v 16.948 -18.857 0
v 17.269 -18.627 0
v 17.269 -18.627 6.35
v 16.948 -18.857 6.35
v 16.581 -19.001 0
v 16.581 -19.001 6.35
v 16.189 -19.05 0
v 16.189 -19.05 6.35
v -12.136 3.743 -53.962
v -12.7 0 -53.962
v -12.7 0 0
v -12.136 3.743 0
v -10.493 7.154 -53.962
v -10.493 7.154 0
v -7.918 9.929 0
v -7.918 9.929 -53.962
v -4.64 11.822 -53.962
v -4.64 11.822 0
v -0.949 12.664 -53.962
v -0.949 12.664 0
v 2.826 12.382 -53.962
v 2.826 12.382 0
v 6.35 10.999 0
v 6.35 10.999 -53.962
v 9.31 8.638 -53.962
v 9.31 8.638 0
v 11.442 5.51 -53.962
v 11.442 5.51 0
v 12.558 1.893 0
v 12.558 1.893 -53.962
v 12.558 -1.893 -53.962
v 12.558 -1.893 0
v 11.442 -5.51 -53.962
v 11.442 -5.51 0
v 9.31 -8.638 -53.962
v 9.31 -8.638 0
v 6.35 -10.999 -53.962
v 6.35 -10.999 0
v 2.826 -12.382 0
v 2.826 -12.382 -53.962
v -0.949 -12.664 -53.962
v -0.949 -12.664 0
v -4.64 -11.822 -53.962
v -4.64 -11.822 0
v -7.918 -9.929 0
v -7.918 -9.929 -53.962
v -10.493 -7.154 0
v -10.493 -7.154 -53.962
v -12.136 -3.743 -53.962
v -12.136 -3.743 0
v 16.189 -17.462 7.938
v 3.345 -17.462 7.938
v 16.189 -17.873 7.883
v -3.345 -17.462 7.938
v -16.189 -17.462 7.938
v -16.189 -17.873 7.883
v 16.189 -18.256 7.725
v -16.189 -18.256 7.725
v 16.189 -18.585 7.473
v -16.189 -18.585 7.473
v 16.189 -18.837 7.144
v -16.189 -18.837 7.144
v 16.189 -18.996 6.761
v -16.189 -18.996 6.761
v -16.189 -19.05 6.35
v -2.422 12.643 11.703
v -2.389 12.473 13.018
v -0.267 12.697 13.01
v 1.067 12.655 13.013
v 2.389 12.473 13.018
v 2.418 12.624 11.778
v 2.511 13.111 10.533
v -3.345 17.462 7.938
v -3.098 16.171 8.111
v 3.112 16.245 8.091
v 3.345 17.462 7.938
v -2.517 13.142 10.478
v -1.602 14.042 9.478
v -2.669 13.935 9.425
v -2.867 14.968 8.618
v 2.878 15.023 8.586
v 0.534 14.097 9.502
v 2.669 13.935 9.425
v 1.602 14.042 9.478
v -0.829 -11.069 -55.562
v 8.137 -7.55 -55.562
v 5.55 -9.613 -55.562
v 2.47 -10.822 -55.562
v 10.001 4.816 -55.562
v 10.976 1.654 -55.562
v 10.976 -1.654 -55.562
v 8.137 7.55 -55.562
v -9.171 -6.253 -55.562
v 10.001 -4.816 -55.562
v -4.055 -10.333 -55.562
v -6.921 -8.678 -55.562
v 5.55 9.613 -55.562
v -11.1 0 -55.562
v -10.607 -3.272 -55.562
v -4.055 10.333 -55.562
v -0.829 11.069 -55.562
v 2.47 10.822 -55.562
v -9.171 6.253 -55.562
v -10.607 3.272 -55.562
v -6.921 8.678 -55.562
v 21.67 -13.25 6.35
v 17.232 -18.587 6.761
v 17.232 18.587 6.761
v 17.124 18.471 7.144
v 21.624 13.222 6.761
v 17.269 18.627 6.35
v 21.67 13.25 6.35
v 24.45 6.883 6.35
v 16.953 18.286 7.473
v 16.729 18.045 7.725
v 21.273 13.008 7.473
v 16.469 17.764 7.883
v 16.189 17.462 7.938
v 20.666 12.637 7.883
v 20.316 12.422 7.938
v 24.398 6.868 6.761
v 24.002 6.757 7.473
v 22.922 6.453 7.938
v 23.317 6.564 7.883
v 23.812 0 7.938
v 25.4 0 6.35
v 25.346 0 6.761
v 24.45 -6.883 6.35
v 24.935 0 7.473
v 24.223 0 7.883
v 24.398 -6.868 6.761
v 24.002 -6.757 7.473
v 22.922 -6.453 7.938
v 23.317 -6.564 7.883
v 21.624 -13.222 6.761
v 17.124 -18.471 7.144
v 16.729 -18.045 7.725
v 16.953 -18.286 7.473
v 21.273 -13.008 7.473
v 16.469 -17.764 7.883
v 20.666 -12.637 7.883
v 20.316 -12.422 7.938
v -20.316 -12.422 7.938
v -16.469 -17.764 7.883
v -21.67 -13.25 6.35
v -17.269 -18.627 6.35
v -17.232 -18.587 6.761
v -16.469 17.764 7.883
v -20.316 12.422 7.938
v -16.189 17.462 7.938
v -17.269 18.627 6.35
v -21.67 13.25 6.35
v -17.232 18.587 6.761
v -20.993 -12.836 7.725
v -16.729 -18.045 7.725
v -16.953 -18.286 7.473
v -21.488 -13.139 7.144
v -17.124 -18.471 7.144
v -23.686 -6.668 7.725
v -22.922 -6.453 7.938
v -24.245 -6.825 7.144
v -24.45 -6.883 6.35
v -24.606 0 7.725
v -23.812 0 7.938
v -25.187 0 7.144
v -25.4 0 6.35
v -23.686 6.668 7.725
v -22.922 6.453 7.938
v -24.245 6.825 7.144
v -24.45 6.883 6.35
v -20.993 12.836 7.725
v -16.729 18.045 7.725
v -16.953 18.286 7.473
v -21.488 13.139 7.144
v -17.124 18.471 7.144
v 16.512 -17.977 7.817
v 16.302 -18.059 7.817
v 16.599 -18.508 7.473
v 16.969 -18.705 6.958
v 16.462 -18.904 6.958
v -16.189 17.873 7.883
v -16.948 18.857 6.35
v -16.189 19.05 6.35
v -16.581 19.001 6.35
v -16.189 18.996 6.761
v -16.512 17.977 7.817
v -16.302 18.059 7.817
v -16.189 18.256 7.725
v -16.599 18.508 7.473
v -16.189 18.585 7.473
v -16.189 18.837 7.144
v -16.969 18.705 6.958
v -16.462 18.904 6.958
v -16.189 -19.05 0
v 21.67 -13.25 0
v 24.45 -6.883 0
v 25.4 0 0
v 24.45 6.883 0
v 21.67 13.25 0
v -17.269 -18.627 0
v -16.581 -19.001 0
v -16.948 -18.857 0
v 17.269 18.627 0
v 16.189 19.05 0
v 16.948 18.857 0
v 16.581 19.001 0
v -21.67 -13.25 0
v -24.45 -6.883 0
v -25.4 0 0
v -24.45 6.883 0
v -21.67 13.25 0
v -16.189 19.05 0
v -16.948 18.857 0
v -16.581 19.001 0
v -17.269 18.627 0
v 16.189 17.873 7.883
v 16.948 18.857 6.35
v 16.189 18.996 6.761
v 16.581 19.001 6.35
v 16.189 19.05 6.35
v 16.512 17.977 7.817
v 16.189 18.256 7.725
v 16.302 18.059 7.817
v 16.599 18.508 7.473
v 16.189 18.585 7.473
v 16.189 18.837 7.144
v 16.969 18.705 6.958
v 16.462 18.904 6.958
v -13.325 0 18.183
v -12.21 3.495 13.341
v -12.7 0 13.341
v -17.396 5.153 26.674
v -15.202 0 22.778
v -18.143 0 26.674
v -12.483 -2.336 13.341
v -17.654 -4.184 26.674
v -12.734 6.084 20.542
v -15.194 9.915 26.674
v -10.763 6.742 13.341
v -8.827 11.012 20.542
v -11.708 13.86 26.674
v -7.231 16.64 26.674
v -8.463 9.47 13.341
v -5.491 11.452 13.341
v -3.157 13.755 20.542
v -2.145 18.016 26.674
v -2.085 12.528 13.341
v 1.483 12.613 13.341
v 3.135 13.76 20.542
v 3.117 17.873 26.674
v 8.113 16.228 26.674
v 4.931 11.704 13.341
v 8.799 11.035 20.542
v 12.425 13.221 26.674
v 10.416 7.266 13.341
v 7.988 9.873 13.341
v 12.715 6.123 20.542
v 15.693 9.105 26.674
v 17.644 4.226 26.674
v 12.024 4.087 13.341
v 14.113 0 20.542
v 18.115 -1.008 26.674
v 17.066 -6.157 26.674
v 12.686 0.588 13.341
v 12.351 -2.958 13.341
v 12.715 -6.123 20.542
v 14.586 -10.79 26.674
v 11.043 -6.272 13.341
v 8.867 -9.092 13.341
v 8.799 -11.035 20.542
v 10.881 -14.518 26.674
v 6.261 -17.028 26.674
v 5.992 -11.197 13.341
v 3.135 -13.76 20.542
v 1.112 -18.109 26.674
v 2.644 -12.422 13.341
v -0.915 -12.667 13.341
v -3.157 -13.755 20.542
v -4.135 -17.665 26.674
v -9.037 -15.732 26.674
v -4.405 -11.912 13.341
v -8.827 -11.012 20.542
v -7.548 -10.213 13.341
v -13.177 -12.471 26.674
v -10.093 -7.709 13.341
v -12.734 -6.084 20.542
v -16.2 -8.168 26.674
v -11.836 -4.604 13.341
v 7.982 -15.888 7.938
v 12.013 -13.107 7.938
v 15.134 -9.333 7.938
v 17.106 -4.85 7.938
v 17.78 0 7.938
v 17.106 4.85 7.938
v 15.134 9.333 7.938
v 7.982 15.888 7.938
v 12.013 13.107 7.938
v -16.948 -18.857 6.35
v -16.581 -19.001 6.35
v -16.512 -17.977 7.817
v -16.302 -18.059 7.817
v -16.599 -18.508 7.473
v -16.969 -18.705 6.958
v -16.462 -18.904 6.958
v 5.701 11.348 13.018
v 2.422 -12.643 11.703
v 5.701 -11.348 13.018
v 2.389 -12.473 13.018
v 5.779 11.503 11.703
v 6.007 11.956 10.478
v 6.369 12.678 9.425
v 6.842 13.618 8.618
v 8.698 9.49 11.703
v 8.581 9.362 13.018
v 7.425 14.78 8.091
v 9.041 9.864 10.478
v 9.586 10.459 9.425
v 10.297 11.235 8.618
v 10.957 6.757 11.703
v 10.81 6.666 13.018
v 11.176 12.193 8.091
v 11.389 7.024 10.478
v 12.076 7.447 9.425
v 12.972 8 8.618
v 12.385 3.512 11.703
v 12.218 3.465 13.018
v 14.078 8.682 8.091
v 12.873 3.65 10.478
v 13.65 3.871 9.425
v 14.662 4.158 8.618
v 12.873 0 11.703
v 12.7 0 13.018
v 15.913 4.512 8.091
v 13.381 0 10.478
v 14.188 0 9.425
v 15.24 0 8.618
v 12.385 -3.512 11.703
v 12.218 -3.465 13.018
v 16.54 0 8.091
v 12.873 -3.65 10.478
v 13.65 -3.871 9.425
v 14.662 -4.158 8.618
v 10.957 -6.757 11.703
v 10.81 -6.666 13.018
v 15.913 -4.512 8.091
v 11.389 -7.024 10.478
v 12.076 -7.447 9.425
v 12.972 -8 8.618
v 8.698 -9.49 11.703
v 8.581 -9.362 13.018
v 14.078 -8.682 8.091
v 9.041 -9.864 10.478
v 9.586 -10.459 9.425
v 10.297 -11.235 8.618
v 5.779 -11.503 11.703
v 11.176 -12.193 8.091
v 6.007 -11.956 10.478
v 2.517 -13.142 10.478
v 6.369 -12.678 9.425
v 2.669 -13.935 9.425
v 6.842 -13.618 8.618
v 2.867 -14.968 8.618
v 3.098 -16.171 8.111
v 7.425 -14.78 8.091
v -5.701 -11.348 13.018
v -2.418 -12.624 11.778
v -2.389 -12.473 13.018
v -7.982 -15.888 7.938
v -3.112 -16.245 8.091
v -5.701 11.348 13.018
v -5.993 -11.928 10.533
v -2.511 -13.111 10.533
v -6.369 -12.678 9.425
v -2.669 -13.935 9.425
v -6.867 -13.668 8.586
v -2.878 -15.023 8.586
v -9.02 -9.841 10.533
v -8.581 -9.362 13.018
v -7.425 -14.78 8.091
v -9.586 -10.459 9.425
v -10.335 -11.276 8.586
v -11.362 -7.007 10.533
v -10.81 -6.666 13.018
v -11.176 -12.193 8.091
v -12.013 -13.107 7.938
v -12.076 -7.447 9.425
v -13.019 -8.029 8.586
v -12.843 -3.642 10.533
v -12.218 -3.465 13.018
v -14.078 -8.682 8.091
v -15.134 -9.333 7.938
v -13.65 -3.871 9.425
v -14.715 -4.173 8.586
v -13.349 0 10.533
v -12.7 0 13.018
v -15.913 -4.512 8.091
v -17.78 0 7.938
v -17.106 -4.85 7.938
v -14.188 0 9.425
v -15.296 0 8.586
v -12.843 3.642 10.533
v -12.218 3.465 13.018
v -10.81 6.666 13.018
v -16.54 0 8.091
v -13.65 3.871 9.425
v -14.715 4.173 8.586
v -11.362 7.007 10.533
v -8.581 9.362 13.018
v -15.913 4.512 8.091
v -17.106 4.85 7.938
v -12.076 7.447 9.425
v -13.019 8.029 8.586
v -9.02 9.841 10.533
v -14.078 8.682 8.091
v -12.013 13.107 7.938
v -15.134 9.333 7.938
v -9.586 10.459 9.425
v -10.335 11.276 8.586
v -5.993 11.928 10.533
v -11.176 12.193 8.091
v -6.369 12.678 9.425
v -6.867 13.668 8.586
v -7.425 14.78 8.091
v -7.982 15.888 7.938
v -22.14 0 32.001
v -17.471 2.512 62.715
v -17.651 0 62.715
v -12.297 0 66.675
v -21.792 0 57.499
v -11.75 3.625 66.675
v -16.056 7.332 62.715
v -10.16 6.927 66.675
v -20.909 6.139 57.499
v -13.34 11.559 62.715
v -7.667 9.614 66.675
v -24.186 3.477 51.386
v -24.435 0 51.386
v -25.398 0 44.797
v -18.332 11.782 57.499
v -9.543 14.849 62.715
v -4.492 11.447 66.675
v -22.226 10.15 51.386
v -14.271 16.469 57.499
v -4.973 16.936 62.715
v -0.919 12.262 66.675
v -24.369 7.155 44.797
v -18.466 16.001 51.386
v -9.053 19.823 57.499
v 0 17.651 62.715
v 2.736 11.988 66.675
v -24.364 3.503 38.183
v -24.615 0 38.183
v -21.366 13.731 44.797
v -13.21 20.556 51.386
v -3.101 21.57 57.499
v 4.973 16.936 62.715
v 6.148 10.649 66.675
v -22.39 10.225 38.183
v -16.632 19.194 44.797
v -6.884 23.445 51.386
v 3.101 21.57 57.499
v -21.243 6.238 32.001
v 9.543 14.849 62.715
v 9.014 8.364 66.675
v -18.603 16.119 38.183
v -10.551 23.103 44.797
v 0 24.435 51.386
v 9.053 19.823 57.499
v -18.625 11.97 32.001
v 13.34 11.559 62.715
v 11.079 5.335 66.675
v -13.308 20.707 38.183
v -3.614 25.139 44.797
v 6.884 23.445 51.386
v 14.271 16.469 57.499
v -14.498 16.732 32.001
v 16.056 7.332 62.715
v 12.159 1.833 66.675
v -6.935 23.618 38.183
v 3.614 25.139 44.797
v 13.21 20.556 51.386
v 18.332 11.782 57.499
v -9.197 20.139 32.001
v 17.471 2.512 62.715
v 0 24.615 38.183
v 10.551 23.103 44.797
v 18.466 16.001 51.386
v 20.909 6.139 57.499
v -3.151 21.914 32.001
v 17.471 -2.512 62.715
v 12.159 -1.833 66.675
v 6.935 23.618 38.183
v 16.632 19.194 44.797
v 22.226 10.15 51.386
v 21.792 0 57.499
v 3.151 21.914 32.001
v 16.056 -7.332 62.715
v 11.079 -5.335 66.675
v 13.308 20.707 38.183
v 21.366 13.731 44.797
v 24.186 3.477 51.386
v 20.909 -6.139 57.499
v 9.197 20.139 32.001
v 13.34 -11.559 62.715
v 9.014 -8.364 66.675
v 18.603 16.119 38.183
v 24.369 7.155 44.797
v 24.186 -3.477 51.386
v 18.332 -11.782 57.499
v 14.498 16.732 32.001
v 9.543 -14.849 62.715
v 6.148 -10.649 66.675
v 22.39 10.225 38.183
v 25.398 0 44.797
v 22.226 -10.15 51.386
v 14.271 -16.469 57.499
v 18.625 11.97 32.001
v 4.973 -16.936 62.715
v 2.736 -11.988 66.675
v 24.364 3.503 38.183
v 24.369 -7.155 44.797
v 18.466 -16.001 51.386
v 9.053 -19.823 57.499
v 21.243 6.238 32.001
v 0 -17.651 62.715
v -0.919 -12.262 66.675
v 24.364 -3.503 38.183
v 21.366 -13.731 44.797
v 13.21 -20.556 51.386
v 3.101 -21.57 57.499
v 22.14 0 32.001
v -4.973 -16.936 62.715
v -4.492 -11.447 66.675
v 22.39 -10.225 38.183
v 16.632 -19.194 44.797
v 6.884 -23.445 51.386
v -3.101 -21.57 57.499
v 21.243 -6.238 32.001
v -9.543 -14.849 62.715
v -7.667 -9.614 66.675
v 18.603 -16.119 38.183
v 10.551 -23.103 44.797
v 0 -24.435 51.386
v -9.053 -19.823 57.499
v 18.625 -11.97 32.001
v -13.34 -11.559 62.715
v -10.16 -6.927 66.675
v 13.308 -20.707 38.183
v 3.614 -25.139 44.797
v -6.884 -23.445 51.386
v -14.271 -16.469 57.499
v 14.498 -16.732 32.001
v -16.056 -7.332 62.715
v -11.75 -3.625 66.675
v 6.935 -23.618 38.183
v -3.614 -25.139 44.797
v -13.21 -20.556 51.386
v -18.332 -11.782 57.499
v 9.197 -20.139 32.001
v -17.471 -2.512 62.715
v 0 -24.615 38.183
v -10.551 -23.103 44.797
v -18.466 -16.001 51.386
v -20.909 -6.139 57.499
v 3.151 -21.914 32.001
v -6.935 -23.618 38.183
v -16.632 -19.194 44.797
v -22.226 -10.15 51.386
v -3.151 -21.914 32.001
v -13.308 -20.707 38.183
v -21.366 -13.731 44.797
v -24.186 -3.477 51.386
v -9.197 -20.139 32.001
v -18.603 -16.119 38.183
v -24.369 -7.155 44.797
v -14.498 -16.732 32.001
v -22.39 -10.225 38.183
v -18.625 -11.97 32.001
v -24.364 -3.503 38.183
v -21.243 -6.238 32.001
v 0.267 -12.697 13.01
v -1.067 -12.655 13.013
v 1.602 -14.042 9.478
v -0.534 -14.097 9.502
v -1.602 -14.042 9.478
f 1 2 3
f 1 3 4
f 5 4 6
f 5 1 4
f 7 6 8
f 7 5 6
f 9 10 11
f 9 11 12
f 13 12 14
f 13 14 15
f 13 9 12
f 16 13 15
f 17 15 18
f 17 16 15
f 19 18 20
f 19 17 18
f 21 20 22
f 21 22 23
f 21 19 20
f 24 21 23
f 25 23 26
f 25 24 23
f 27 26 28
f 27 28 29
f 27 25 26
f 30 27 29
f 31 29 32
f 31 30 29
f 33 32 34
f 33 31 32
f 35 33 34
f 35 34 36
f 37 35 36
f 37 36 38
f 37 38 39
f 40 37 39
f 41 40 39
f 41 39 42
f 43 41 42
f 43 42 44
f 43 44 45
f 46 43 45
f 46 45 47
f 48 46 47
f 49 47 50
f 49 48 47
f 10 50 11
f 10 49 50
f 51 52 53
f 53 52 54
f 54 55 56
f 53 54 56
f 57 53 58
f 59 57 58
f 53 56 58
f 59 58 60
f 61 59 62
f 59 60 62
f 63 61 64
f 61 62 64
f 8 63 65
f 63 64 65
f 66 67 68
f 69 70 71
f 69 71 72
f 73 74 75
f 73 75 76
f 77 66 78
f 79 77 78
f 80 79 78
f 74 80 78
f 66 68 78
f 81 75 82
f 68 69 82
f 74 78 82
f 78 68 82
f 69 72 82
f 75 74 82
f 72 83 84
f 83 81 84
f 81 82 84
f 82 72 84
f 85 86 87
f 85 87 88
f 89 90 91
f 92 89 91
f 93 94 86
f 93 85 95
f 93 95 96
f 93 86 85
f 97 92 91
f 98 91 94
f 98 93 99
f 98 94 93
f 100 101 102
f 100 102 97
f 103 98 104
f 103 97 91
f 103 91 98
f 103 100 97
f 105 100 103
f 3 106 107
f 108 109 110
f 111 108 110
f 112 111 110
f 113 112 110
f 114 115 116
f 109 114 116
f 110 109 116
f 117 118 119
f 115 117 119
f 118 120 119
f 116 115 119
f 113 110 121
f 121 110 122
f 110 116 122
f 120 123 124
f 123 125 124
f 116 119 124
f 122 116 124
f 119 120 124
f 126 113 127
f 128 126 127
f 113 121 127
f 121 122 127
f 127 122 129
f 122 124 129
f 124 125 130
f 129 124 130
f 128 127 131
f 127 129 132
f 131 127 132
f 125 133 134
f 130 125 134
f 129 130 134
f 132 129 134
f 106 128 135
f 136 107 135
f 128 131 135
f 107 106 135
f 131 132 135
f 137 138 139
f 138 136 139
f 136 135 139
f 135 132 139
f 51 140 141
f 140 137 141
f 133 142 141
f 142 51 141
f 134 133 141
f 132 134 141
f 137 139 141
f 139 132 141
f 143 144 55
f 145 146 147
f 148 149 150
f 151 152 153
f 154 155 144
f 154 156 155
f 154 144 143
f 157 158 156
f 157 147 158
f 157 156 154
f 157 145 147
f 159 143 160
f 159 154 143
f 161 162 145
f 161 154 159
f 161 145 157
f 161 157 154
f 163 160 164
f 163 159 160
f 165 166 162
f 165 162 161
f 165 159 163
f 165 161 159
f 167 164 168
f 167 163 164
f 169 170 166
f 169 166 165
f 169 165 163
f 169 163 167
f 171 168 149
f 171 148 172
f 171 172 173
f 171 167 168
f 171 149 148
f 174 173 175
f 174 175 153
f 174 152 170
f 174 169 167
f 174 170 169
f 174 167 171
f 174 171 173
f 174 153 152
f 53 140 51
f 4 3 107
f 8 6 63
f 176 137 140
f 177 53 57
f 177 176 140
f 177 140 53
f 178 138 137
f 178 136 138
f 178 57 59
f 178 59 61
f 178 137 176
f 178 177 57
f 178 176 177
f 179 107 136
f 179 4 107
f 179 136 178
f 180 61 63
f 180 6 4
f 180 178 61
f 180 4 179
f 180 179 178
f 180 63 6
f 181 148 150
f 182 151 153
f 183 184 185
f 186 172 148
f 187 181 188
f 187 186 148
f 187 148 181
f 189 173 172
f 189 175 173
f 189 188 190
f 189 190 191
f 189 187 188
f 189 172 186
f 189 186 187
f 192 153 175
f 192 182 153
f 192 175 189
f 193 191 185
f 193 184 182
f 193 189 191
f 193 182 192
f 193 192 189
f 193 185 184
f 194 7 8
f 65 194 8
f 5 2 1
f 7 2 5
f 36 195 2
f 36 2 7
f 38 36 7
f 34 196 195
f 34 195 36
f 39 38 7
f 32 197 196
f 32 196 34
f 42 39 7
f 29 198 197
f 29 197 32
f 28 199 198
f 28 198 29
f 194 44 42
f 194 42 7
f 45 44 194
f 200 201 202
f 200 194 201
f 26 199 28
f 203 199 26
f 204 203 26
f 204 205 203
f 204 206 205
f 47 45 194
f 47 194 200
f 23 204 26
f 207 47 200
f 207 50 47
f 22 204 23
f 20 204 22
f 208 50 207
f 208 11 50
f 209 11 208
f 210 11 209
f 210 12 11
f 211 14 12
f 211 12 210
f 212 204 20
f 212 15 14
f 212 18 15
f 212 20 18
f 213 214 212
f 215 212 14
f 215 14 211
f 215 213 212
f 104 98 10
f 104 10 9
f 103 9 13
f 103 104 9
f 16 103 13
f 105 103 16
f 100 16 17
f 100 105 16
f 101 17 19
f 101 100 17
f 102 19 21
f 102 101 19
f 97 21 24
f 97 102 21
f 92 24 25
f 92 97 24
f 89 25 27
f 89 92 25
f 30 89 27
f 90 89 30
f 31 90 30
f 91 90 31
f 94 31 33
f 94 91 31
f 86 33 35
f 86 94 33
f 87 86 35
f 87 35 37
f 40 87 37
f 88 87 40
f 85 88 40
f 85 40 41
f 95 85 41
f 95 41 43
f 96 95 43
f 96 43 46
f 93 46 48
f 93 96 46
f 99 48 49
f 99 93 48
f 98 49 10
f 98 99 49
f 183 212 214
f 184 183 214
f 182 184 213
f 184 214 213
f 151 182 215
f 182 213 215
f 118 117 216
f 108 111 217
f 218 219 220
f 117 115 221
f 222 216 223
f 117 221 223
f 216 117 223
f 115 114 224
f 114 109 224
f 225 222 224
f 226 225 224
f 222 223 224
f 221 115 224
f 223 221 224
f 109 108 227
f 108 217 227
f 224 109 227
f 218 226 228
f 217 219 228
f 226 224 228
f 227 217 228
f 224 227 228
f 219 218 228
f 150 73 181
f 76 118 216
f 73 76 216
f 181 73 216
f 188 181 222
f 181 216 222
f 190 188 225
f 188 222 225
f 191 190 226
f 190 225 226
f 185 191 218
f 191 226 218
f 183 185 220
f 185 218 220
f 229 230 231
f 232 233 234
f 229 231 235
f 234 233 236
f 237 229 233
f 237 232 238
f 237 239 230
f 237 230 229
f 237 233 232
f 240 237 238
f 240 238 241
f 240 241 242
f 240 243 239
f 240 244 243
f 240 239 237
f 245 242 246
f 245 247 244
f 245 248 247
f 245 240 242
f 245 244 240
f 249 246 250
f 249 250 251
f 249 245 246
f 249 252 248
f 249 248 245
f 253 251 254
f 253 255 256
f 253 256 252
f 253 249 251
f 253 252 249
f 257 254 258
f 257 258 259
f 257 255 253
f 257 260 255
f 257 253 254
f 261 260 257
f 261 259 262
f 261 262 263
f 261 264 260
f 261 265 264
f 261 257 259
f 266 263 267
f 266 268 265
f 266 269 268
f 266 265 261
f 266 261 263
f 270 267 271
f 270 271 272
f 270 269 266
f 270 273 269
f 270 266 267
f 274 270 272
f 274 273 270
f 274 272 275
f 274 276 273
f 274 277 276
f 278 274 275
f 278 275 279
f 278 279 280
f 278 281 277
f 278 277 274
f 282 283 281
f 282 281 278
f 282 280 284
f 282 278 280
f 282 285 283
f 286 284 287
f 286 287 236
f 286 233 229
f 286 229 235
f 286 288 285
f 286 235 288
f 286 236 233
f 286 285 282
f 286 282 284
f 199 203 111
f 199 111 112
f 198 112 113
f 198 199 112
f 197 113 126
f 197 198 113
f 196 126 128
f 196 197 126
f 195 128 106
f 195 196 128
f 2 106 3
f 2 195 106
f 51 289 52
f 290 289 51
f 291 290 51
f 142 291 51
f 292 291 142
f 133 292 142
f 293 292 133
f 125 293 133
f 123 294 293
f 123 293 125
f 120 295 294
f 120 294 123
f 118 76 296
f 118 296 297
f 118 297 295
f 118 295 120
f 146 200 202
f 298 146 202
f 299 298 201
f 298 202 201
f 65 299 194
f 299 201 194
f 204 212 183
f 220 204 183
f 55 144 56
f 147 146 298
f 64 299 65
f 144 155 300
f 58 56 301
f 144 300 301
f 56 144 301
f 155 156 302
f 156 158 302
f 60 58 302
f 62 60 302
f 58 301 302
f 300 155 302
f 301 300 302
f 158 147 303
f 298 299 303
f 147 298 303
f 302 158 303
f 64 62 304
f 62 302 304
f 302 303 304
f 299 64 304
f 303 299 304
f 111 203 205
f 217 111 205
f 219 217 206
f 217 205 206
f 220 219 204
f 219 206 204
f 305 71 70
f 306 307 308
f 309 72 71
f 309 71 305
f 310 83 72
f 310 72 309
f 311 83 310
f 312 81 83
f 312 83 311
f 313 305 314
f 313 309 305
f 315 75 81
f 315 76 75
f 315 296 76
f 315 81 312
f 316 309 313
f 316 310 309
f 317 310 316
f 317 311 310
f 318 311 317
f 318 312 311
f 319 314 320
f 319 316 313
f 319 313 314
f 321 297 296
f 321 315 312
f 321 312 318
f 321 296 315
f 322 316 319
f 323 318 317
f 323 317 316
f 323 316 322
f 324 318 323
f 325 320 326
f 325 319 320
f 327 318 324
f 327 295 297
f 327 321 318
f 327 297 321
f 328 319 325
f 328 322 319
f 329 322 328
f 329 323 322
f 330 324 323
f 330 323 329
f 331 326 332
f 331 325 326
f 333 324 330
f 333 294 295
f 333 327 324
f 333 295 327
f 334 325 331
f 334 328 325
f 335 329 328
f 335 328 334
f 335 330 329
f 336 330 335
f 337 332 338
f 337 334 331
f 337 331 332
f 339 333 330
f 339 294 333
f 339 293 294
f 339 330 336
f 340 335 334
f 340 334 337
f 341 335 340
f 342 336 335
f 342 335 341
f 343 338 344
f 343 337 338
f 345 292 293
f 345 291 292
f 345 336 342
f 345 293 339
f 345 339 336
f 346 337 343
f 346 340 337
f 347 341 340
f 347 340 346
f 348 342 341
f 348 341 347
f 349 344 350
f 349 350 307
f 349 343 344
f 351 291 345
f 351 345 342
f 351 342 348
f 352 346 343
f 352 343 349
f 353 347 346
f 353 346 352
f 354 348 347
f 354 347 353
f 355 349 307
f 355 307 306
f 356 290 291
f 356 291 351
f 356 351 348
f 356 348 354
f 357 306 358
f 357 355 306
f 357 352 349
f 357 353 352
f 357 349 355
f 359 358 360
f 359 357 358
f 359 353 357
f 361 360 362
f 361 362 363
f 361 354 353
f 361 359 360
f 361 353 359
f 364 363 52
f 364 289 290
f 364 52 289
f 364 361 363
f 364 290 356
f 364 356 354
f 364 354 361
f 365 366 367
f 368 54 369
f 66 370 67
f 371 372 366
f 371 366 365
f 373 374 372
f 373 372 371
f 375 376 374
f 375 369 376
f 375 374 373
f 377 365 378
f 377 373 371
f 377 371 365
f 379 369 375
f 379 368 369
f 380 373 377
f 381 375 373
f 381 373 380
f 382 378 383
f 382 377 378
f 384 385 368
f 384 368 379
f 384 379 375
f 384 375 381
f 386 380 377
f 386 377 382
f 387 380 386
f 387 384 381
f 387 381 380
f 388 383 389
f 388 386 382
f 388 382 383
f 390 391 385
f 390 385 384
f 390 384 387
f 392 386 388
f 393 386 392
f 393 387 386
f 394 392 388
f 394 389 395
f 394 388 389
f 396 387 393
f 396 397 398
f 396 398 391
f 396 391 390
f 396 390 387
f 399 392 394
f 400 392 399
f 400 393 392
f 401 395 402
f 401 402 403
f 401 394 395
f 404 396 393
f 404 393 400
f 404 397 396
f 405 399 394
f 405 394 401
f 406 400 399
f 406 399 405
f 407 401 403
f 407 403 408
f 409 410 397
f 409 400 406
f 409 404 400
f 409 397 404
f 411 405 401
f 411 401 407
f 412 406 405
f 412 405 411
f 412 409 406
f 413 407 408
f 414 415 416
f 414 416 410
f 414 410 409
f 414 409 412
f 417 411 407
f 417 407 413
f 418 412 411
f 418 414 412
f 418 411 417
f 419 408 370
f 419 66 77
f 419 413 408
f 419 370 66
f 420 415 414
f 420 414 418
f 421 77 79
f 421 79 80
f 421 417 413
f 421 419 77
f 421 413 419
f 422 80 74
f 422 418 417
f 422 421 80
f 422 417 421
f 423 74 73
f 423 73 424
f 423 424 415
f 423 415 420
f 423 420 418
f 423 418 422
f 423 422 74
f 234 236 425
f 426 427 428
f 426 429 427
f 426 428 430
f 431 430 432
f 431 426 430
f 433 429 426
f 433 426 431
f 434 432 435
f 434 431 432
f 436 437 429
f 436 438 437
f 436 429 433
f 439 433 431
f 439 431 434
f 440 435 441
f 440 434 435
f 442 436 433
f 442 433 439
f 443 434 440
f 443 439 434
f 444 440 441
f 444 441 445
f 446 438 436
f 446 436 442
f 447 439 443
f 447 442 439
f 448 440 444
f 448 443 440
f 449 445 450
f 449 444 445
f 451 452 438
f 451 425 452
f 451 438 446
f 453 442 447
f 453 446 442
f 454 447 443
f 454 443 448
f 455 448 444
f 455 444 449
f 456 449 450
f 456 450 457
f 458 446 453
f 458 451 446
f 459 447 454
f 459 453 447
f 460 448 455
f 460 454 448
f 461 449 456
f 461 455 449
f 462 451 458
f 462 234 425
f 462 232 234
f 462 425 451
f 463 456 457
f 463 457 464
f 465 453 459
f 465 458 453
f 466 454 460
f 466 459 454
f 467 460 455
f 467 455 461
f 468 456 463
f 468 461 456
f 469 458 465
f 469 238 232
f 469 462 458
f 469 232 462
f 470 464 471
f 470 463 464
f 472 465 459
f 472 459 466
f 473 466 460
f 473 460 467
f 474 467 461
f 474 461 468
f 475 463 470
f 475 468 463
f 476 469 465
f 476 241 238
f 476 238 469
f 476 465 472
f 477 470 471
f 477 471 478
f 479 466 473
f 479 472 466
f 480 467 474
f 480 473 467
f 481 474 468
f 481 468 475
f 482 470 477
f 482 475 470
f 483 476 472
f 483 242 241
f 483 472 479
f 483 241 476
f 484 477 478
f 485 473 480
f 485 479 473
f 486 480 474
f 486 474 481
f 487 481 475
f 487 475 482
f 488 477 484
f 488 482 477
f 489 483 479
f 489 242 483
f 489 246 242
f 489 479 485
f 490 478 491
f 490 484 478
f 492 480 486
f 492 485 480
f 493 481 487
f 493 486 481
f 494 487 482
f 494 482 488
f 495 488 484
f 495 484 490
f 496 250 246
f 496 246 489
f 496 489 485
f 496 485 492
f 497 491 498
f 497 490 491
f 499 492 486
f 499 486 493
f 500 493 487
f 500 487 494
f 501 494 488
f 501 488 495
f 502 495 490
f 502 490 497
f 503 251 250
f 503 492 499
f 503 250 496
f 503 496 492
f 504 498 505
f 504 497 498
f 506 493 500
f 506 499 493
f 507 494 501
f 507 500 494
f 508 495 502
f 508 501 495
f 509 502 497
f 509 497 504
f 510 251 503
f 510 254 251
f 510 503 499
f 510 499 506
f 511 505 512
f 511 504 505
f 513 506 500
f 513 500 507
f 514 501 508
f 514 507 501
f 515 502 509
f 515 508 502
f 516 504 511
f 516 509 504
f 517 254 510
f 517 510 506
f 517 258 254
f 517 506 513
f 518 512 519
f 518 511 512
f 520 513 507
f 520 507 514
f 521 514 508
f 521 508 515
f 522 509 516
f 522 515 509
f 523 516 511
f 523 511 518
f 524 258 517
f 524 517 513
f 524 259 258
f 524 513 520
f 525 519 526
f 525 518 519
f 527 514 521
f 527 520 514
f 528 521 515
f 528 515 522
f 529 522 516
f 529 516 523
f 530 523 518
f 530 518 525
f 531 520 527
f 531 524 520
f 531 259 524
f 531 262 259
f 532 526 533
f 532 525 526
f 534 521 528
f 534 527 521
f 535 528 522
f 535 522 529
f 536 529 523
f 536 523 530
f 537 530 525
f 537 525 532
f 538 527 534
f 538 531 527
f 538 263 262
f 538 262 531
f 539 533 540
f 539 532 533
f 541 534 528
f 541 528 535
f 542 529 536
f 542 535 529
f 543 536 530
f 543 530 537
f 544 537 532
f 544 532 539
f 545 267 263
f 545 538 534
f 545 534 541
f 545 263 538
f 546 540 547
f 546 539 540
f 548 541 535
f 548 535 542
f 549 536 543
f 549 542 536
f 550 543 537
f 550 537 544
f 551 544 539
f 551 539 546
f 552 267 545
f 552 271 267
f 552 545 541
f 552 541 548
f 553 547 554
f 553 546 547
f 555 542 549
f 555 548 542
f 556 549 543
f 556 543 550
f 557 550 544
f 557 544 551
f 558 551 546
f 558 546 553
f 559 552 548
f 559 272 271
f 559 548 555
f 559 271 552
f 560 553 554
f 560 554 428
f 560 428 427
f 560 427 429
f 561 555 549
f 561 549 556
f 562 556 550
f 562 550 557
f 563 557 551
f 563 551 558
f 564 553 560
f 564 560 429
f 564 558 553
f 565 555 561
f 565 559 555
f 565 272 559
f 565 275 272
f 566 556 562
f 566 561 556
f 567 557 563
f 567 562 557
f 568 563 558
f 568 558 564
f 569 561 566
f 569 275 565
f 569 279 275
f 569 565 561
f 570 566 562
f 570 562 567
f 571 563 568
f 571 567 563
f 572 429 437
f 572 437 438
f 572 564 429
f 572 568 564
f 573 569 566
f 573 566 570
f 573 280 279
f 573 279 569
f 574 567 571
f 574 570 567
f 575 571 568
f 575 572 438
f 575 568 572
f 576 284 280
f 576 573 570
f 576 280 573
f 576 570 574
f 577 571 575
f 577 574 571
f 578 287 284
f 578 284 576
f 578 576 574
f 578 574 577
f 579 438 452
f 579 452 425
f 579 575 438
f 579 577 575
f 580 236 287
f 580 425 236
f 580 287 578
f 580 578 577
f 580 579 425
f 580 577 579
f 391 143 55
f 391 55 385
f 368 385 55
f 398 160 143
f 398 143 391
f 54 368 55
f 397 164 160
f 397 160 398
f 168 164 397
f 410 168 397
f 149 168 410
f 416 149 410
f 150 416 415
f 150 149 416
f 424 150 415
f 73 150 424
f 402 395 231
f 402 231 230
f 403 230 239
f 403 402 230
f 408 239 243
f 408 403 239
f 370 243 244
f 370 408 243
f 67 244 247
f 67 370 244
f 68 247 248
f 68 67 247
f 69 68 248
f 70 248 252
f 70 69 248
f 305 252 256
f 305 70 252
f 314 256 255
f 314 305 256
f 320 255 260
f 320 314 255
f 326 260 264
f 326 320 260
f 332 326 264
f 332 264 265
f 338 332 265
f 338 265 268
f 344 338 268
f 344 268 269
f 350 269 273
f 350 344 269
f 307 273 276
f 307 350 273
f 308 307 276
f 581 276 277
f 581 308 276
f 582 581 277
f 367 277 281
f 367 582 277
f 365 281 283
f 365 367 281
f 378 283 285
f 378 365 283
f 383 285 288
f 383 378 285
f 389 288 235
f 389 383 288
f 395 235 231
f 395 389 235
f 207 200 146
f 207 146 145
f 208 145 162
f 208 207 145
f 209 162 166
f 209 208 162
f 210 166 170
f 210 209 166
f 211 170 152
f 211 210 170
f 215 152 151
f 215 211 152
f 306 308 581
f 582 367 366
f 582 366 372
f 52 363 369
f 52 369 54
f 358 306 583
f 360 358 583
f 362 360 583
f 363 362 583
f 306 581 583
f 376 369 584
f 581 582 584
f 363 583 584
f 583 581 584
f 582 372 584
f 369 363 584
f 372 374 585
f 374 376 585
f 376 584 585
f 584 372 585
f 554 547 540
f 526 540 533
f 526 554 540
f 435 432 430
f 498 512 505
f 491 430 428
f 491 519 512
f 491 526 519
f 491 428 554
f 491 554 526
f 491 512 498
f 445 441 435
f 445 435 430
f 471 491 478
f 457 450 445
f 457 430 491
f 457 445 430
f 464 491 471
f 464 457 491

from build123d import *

# Parameters (mm, degrees)
F2_W          = 30.5360297733
F2_H          = 20.1705897587
F3_DEPTH      = 25.401
F3_DEPTH_BACK = 25.4
F4_R          = 1.5875
F5_SIZE       = 1.6002
F6_R          = 19.05
F7_R          = 5.08


with BuildPart() as f1:
    # F0 (on Front) → F1 (revolve)
    with BuildSketch(Plane.XZ):
        with BuildLine():
            Line((-25.4, 0), (-12.7, 0))
            Line((-12.7, 0), (-12.7, -55.5625))
            Line((-12.7, -55.5625), (0, -55.5625))
            Line((0, -55.5625), (0, 0))
            Line((0, 0), (0, 7.9375))
            Line((0, 7.9375), (0, 19.05))
            Line((0, 19.05), (0, 66.675))
            Line((0, 66.675), (-12.2967221242, 66.675))
            ThreePointArc((-12.2967221242, 66.675), (-25.3989438933, 44.6816227592), (-12.7, 22.4529547439))
            Line((-12.7, 22.4529547439), (-12.7, 7.9375))
            Line((-12.7, 7.9375), (-25.4, 7.9375))
            Line((-25.4, 7.9375), (-25.4, 0))
        make_face()
    revolve(axis=Axis((0, 0, -27.78125), (0, 0, -1)))

    # F2 (on Right) → F3 (cut, two sides)
    with BuildSketch(Plane.YZ) as f3_sk:
        with Locations((-34.3180148866, 4.7039177944)):
            Rectangle(F2_W, F2_H)
        with Locations((34.3180148866, 4.7039177944)):
            Rectangle(F2_W, F2_H)
    extrude(amount=-F3_DEPTH, mode=Mode.SUBTRACT)
    extrude(f3_sk.sketch, amount=F3_DEPTH_BACK, mode=Mode.SUBTRACT)

    # F4
    f4_edges = [f1.edges().sort_by_distance(p)[0] for p in [
        (-25.4, 0, 7.9375),
        (25.4, 0, 7.9375),
        (0, -19.05, 7.9375),
        (0, 19.05, 7.9375),
        (16.800521, 19.05, 3.96875),
        (-16.800521, 19.05, 3.96875),
        (16.800521, -19.05, 3.96875),
        (-16.800521, -19.05, 3.96875),
    ]]
    fillet(f4_edges, radius=F4_R)

    # F5
    f5_edges = [f1.edges().sort_by_distance(p)[0] for p in [
        (12.7, 0, -55.5625),
    ]]
    chamfer(f5_edges, length=F5_SIZE)

    # F6
    f6_edges = [f1.edges().sort_by_distance(p)[0] for p in [
        (12.7, 0, 22.452955),
    ]]
    fillet(f6_edges, radius=F6_R)

    # F7
    f7_edges = [f1.edges().sort_by_distance(p)[0] for p in [
        (12.7, 0, 7.9375),
    ]]
    fillet(f7_edges, radius=F7_R)


solid = f1.part
